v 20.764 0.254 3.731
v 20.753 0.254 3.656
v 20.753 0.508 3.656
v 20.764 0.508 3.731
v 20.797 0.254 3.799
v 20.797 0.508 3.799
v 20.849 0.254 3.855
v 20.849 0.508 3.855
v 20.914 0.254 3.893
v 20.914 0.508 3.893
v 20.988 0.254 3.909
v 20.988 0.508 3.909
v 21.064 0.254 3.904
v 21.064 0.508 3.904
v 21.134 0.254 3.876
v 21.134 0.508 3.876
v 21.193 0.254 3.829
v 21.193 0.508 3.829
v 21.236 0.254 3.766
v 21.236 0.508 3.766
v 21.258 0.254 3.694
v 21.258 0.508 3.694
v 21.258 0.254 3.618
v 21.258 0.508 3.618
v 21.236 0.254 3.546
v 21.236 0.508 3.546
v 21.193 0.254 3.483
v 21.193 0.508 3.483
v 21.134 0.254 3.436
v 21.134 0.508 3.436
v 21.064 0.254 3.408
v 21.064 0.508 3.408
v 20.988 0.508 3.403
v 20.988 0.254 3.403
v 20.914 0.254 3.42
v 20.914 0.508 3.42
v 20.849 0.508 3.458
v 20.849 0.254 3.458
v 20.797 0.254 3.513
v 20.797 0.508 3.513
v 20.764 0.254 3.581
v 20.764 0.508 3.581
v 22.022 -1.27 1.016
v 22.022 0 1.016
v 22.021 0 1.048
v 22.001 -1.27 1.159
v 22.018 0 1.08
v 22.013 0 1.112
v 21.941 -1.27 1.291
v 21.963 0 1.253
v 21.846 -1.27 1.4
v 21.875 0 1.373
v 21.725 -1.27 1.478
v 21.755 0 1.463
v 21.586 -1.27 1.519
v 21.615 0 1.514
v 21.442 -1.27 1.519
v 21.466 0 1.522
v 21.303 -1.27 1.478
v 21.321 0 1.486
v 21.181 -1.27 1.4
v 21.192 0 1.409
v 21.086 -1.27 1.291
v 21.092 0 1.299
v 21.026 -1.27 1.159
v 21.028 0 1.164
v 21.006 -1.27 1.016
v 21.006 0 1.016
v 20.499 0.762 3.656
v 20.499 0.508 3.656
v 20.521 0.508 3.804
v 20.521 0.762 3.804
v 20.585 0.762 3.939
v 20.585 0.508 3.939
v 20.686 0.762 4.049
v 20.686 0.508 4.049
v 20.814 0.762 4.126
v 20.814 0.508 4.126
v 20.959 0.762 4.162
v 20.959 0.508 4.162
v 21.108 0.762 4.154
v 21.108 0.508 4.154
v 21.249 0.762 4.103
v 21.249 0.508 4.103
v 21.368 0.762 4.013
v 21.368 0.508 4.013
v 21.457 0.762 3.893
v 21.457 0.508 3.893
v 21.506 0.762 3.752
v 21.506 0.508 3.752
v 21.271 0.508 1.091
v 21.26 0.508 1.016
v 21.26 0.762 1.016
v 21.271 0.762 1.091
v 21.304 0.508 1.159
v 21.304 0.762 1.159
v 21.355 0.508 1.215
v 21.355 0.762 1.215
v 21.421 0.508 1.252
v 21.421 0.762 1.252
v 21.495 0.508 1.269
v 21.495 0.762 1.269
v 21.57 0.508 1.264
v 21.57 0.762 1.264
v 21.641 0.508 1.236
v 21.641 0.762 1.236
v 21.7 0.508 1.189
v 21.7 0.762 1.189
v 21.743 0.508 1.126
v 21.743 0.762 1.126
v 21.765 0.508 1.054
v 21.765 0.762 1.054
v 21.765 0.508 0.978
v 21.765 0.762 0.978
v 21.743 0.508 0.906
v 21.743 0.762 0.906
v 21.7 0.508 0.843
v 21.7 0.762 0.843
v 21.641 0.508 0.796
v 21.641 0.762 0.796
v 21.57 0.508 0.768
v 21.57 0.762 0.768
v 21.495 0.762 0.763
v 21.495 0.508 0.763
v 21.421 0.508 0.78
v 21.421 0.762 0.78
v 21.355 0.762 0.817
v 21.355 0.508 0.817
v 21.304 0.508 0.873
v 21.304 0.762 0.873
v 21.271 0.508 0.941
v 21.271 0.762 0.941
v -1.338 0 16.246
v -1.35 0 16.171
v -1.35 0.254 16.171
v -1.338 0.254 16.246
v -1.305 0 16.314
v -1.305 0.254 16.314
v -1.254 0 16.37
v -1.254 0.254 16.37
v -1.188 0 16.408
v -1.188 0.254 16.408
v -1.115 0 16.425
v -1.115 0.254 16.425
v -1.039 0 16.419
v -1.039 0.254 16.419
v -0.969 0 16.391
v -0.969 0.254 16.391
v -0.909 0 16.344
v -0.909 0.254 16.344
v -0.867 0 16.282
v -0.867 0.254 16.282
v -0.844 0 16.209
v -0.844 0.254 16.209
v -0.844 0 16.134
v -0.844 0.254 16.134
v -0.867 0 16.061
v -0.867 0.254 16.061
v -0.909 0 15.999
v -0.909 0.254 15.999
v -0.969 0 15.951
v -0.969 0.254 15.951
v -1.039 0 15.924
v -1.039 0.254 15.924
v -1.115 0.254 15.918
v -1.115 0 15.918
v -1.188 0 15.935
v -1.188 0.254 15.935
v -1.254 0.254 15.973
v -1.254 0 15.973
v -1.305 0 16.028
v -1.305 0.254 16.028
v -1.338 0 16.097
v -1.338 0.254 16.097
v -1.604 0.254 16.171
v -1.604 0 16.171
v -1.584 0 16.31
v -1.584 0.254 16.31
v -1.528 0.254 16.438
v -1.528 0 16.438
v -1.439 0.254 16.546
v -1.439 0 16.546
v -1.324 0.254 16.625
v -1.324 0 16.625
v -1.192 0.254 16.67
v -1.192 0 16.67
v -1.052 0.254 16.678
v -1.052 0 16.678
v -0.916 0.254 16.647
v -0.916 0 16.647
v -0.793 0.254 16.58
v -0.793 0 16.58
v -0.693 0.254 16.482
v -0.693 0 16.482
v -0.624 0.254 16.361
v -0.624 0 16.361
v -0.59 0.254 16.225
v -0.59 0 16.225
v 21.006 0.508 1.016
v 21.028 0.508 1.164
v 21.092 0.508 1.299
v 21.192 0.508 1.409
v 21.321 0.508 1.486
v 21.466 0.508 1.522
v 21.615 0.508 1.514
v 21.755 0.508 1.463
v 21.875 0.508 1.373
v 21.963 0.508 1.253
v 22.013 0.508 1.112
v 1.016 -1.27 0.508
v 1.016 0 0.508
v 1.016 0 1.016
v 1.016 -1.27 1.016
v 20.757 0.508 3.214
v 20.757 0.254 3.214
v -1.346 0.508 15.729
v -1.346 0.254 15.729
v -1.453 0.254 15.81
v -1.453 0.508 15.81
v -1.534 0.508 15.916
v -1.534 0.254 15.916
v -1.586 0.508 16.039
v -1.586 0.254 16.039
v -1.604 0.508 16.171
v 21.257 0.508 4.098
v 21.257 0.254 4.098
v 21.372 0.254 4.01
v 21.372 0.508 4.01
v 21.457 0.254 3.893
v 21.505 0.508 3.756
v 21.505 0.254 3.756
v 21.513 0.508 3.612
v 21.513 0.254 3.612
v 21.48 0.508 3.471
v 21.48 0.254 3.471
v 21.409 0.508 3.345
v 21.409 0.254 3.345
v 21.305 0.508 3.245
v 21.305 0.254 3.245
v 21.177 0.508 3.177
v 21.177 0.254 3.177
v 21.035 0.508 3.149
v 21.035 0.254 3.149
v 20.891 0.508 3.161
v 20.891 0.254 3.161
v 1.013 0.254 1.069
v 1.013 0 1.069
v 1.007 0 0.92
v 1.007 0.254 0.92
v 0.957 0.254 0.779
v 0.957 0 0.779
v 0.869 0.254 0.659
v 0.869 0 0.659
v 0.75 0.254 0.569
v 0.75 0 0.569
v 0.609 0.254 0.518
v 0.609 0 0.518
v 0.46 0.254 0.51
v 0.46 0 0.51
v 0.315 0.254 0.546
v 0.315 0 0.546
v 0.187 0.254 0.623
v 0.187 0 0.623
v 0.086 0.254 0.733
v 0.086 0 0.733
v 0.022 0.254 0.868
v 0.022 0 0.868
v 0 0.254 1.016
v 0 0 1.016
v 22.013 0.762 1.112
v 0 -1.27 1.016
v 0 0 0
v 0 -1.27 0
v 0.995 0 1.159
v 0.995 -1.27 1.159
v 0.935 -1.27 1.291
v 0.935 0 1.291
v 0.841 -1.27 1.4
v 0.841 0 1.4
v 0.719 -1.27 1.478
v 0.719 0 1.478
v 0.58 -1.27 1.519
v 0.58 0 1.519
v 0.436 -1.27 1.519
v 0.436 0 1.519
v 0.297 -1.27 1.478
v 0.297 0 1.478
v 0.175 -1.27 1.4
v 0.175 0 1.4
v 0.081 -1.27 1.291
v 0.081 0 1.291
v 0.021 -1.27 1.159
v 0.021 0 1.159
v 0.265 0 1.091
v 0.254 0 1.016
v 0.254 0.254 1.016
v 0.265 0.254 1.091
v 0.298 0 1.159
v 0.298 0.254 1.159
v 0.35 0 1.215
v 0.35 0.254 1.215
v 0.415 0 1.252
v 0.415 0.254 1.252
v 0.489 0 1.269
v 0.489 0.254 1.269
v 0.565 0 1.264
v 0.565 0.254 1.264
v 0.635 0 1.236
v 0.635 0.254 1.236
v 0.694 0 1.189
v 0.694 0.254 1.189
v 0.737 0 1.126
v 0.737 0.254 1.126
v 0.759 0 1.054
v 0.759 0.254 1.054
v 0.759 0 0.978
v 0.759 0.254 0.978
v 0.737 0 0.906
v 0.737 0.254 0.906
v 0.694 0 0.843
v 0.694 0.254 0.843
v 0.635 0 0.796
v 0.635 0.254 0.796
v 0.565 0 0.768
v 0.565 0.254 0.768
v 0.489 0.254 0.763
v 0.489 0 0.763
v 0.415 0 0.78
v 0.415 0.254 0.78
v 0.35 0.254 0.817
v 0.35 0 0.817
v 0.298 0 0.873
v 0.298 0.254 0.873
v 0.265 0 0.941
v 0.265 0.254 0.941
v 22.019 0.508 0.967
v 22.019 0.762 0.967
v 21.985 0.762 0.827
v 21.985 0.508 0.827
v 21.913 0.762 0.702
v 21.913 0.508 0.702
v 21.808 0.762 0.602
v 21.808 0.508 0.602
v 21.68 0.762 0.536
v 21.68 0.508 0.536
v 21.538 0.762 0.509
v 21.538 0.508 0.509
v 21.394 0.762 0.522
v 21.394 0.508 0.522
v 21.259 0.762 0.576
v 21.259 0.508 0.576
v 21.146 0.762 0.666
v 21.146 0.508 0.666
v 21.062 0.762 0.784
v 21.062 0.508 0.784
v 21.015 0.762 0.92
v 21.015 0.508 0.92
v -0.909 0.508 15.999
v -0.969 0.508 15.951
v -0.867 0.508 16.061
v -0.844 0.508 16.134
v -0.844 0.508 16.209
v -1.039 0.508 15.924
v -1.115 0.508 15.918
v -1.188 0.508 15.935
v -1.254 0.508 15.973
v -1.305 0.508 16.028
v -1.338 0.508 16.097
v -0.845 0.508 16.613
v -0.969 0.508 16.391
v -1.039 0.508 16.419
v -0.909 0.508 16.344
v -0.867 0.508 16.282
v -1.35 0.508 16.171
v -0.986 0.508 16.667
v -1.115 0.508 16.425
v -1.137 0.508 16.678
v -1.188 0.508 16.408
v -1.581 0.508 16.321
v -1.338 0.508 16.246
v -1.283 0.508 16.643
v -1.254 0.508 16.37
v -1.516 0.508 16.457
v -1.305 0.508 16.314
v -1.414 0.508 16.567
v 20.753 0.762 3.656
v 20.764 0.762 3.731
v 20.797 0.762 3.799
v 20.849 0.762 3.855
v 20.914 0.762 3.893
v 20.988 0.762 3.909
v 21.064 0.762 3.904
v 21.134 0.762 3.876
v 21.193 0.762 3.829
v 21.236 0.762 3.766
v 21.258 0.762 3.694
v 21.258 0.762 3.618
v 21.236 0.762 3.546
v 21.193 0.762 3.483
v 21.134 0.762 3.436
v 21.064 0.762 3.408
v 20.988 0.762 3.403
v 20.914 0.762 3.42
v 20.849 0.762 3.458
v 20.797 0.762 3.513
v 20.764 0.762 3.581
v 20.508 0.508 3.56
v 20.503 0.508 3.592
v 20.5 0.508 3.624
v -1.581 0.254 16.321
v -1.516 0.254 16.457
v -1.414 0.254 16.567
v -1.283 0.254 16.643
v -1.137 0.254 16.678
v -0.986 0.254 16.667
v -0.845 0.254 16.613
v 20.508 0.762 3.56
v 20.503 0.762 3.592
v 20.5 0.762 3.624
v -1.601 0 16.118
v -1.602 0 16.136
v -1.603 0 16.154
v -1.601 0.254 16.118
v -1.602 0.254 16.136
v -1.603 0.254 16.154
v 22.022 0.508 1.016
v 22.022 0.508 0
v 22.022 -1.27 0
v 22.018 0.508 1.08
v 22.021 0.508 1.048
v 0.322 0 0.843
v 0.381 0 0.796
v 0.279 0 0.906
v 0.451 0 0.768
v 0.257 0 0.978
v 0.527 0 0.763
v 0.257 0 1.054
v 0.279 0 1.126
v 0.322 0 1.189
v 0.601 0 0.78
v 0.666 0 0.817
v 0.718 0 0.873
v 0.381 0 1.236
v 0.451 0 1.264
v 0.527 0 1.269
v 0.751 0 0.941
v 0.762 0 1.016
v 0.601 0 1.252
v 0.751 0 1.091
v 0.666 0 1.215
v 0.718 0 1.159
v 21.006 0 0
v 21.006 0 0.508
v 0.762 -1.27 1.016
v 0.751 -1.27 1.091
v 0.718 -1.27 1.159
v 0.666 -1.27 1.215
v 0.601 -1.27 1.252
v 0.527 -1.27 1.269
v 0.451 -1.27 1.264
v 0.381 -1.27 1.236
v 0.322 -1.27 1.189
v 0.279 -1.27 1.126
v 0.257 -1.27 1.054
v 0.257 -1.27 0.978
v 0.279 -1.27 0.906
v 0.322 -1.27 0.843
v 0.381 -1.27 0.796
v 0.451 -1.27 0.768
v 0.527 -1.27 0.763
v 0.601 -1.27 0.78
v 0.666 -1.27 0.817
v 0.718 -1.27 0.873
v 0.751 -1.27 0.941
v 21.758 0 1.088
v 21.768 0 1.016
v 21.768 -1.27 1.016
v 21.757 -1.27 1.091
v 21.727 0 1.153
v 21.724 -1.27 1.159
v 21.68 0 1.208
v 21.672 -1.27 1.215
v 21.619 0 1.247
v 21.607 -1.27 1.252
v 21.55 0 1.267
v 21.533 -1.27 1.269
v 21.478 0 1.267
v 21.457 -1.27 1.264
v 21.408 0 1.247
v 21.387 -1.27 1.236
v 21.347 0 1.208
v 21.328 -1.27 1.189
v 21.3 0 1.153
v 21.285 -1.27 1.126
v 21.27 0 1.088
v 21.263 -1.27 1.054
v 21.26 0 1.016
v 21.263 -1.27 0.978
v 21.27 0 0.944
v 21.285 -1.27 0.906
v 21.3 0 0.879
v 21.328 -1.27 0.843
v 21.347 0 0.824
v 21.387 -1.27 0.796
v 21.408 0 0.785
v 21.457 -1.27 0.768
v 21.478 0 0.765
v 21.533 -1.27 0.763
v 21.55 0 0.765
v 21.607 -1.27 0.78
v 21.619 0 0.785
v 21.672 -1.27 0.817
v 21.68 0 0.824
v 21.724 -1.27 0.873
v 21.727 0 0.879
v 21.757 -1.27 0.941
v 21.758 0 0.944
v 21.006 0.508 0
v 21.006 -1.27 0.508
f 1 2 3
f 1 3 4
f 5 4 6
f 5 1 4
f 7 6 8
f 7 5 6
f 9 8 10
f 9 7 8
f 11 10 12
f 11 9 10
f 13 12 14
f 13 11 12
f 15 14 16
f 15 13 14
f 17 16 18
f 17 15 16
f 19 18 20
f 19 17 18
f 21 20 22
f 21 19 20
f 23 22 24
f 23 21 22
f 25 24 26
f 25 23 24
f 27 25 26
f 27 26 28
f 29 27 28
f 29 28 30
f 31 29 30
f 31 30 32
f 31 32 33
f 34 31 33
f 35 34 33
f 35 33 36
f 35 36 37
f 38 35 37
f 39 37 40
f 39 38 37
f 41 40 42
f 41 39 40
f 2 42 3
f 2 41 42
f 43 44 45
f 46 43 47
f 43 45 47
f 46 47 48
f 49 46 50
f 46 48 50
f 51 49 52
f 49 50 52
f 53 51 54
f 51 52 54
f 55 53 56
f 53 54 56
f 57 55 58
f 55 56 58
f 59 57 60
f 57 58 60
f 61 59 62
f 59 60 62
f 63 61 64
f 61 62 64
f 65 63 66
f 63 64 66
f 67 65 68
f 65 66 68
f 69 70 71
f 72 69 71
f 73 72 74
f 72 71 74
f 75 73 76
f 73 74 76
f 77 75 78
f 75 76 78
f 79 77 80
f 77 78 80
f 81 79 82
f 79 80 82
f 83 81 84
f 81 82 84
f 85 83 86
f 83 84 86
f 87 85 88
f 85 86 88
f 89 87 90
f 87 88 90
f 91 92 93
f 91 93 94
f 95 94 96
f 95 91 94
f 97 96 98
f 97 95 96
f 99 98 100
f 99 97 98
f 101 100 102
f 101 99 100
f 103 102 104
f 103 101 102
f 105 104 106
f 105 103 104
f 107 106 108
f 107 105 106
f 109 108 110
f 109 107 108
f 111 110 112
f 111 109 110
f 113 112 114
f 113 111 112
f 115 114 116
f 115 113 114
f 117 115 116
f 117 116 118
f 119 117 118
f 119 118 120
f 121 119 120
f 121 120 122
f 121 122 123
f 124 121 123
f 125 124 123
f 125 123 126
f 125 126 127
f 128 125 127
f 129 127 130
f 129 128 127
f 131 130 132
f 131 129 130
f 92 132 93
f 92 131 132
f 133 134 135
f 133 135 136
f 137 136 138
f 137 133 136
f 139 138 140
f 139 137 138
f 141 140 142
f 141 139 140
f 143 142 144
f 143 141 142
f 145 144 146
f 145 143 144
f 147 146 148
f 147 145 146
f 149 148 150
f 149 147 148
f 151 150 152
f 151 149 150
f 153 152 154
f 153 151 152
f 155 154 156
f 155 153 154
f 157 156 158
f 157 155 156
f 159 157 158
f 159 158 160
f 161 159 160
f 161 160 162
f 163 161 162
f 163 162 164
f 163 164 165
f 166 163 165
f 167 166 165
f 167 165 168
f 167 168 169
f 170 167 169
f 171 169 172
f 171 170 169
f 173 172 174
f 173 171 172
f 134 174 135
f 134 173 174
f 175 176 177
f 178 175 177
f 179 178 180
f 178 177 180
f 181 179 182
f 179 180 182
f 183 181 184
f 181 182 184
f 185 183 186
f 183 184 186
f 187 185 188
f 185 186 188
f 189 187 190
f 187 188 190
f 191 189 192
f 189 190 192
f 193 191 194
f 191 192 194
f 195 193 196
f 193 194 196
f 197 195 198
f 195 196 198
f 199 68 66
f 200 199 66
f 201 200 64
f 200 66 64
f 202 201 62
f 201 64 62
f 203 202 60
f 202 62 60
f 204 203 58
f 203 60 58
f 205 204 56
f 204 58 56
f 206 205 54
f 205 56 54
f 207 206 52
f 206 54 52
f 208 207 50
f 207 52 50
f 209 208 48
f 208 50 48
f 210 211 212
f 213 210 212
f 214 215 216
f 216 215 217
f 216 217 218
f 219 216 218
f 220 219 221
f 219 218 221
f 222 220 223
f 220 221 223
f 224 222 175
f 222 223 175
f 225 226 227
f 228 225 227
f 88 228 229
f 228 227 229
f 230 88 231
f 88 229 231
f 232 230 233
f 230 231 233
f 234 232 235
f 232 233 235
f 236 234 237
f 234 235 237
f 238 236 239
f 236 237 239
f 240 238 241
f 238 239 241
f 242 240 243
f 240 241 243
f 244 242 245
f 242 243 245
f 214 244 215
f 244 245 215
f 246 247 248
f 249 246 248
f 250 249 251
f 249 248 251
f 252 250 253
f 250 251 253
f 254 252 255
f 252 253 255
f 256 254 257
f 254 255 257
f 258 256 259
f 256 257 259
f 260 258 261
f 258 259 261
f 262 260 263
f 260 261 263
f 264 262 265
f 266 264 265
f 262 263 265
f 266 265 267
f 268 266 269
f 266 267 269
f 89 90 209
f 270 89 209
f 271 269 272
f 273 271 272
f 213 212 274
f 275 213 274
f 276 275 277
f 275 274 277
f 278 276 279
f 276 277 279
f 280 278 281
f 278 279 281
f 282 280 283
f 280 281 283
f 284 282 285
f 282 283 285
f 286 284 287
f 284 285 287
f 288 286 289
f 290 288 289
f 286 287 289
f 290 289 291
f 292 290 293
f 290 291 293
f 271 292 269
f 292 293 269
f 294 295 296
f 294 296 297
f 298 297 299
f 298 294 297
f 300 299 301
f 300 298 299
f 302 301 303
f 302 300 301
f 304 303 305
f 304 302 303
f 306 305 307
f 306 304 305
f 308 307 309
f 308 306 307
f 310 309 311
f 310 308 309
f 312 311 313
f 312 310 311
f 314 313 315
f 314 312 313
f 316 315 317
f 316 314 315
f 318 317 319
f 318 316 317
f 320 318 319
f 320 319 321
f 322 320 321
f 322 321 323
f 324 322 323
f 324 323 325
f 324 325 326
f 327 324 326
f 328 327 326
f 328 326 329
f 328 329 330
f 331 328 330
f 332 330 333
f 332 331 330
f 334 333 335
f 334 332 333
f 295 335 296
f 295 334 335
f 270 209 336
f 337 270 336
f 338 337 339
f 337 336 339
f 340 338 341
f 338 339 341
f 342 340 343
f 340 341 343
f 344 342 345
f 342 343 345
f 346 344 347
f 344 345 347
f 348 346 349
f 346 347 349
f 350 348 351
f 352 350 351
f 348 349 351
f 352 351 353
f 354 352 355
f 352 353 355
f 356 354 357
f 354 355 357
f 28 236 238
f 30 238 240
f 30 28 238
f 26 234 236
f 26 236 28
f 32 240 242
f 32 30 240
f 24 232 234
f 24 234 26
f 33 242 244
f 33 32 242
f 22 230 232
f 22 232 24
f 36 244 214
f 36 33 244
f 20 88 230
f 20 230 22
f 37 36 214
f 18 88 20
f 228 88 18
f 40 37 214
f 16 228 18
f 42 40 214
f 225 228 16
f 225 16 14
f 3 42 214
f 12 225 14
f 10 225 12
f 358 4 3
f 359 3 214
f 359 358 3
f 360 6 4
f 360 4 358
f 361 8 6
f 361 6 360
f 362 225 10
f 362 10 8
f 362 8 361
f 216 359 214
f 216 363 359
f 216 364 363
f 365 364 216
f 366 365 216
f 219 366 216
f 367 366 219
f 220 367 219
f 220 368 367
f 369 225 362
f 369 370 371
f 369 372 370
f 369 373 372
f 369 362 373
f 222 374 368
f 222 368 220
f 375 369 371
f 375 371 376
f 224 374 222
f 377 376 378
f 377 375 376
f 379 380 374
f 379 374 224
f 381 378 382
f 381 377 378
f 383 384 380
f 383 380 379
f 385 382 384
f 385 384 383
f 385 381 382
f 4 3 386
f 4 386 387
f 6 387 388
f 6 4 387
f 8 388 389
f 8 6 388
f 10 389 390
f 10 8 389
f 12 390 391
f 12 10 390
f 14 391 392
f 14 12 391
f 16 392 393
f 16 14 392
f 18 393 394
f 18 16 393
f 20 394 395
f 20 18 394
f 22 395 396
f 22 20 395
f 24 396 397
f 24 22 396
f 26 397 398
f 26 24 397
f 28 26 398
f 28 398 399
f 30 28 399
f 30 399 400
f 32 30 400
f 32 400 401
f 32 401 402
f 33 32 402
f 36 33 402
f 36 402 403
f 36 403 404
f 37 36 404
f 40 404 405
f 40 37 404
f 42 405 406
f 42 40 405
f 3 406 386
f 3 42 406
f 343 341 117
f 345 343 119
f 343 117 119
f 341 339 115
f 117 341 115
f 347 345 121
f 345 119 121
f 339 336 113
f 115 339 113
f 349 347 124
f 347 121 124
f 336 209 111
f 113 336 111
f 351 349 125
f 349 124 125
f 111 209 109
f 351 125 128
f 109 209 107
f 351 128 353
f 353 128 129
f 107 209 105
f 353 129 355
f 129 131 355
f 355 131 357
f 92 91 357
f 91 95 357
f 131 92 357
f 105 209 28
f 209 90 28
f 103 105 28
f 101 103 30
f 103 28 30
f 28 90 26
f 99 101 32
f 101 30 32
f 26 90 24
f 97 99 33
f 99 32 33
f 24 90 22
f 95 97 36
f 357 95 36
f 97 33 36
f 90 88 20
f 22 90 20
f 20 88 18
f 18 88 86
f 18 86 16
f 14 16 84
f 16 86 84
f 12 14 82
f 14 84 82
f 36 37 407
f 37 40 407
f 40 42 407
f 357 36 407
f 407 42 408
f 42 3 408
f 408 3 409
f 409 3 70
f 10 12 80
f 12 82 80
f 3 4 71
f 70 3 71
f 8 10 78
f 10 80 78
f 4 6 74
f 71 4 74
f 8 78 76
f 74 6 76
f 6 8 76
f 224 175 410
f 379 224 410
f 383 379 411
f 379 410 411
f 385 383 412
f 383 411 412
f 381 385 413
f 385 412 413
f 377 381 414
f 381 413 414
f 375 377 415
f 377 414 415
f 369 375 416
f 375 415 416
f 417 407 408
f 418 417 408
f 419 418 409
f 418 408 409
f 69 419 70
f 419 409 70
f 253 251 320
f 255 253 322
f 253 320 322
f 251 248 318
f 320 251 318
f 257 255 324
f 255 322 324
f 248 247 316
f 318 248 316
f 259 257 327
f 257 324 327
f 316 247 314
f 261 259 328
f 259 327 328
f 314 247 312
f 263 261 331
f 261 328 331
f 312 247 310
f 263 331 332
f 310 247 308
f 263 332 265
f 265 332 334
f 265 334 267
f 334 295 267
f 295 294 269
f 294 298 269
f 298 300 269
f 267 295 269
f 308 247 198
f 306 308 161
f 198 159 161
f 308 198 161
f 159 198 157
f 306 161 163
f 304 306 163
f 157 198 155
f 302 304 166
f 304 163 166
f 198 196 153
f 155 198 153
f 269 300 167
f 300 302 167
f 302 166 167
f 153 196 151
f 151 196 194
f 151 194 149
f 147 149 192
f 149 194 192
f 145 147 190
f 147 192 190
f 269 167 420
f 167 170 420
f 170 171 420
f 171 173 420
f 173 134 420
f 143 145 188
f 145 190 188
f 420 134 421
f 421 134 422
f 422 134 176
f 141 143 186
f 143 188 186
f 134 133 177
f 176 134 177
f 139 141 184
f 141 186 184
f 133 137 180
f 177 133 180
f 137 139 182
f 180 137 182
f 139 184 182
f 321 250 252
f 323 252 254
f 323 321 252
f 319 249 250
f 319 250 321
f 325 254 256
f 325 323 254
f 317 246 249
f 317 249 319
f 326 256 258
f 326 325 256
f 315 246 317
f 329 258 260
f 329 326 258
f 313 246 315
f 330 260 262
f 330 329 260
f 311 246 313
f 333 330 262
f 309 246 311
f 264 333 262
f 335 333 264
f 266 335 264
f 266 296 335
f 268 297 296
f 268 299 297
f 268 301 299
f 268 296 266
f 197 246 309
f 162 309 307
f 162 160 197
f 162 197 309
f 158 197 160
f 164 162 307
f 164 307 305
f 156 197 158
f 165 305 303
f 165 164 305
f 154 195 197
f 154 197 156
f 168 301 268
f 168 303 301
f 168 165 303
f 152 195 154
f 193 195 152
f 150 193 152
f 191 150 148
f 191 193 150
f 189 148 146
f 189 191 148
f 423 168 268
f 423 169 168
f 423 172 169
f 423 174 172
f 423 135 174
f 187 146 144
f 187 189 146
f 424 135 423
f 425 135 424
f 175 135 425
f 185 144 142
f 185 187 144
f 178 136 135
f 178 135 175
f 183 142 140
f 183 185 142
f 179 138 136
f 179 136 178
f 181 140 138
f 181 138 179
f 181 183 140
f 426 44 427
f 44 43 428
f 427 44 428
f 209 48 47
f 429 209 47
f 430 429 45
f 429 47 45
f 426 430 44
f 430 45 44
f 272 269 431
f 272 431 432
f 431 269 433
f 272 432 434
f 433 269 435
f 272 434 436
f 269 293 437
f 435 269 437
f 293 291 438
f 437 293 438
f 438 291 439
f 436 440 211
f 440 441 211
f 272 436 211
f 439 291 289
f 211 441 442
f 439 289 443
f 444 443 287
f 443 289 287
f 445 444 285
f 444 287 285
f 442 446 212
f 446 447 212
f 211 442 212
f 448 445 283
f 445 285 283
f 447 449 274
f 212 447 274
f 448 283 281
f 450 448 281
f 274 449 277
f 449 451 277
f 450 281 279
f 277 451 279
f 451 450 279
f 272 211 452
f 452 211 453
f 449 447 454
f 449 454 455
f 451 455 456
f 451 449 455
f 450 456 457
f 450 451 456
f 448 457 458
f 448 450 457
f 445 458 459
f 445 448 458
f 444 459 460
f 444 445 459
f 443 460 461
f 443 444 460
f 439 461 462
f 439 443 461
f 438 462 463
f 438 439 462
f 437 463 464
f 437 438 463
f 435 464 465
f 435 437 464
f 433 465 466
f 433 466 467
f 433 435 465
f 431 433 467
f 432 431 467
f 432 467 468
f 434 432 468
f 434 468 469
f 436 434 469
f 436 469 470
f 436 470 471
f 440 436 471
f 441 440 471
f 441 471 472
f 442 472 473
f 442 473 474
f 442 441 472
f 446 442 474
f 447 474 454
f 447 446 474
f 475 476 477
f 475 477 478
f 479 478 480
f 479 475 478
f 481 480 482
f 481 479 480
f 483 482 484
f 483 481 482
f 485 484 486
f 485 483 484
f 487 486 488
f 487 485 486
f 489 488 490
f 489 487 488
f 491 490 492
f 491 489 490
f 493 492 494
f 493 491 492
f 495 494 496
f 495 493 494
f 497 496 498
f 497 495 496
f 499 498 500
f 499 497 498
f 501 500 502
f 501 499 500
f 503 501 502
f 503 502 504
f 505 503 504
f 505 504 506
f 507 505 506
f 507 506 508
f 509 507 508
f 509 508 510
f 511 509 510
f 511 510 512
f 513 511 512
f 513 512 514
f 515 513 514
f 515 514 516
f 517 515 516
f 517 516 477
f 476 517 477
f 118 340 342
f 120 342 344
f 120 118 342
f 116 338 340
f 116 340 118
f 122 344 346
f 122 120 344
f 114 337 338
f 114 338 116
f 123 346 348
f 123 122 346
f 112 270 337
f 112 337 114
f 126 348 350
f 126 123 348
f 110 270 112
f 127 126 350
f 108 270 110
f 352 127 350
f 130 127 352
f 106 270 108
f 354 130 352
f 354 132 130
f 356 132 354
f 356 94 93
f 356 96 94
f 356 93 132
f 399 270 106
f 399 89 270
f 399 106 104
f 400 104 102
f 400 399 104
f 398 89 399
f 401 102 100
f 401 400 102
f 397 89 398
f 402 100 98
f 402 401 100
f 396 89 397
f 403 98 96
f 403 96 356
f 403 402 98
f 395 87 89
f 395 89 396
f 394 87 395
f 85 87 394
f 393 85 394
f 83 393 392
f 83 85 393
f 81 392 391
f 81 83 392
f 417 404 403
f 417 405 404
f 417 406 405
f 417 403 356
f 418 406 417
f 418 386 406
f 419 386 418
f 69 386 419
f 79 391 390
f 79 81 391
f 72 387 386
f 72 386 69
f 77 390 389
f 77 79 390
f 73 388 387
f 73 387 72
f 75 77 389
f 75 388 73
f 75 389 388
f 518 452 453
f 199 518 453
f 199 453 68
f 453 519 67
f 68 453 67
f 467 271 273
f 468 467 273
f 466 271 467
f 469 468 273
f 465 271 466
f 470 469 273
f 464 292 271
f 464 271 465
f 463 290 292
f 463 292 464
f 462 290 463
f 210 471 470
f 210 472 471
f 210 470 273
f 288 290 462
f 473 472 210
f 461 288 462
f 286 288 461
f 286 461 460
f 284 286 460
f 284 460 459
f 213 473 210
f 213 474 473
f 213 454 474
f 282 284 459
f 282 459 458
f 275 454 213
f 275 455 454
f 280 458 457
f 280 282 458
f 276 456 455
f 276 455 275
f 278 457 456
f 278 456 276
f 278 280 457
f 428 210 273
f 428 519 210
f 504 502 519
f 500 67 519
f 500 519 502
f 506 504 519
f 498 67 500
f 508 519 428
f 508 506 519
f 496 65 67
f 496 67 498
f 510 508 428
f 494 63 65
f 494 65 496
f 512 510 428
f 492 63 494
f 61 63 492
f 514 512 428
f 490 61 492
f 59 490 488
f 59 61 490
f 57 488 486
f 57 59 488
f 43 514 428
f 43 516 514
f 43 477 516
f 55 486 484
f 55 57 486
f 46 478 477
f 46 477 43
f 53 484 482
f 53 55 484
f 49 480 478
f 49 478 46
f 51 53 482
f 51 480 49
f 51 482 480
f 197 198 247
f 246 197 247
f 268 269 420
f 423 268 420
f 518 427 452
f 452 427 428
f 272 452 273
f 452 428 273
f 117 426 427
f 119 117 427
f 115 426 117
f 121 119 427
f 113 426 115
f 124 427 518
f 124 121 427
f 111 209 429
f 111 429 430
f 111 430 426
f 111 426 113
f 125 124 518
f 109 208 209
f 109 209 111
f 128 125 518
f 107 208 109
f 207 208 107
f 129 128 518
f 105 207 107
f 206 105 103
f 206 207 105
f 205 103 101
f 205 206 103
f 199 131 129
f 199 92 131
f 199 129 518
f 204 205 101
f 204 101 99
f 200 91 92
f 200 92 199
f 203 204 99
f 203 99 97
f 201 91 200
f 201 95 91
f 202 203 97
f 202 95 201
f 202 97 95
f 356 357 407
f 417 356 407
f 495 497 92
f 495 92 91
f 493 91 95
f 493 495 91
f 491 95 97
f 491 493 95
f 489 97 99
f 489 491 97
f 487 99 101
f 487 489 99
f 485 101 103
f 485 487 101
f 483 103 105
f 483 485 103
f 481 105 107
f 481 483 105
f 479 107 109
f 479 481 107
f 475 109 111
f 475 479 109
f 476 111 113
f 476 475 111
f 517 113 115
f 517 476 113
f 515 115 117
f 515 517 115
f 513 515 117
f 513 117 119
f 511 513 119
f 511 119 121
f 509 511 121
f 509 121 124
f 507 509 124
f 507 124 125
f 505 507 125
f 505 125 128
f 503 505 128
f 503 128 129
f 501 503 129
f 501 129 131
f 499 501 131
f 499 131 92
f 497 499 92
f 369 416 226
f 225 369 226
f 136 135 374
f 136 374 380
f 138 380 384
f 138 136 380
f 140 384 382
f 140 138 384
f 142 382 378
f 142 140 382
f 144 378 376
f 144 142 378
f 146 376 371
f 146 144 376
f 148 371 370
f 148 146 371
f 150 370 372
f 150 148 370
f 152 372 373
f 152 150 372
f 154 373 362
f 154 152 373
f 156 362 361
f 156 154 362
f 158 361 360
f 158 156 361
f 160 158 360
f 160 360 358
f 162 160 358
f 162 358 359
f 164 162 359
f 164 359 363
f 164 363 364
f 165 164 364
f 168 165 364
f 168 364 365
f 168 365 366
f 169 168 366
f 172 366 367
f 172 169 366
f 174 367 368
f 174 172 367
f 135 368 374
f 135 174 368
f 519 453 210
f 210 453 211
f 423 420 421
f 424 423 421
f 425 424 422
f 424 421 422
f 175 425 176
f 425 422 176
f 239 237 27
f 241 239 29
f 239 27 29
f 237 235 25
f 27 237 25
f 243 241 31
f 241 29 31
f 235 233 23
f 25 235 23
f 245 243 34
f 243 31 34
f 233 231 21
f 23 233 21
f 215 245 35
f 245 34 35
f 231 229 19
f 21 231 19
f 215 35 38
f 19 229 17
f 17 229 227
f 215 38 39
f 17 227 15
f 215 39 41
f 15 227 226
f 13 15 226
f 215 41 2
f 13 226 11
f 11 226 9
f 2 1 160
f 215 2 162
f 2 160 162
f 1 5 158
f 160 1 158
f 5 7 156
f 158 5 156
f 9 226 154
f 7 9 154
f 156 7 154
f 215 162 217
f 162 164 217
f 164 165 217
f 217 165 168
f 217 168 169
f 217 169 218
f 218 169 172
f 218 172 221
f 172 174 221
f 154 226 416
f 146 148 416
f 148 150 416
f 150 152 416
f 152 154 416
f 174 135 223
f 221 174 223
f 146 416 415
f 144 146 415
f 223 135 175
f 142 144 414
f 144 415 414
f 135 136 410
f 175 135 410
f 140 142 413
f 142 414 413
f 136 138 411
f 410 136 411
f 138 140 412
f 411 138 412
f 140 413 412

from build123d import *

# Parameters (mm, degrees)
F0_R     = 0.254
F1_DEPTH = 1.27
F2_R     = 0.254
F3_DEPTH = 0.254
F4_R     = 0.254
F5_DEPTH = 0.254
F6_R     = 0.254
F7_DEPTH = 0.254
F8_R     = 0.254
F9_DEPTH = 0.508


with BuildPart() as f1:
    # F0 (on Front) → F1 (new body)
    with BuildSketch(Plane.XZ):
        with BuildLine():
            Line((0, 1.016), (0, 0.508))
            Line((0, 0.508), (1.016, 0.508))
            Line((1.016, 0.508), (1.016, 1.016))
            ThreePointArc((1.016, 1.016), (0.508, 1.524), (0, 1.016))
        make_face()
        with Locations((0.508, 1.016)):
            Circle(F0_R, mode=Mode.SUBTRACT)
        Polygon((0, 0.508), (0, 0), (22.0218, 0), (22.0218, 0.508), (21.0058, 0.508), (1.016, 0.508), align=None)
        with BuildLine():
            Line((21.0058, 0.508), (22.0218, 0.508))
            Line((22.0218, 0.508), (22.0218, 1.016))
            ThreePointArc((22.0218, 1.016), (21.5138, 1.524), (21.0058, 1.016))
            Line((21.0058, 1.016), (21.0058, 0.508))
        make_face()
        with Locations((21.5138, 1.016)):
            Circle(F0_R, mode=Mode.SUBTRACT)
    extrude(amount=F1_DEPTH)

    # F8 (on face) → F9 (join)
    with BuildSketch(Plane(origin=(0, 0, 0), x_dir=(-1, 0, 0), z_dir=(0, 1, 0))):
        with BuildLine():
            ThreePointArc((-22.0126938926, 1.1117542892), (-22.0195183492, 1.064093152), (-22.0218, 1.016))
            Line((-22.0218, 1.016), (-22.0218, 0.508))
            Line((-22.0218, 0.508), (-22.0218, 0))
            Line((-22.0218, 0), (-21.0058, 0))
            Line((-21.0058, 0), (-21.0058, 0.508))
            Line((-21.0058, 0.508), (-21.0058, 1.016))
            ThreePointArc((-21.0058, 1.016), (-21.465706848, 1.5217183492), (-22.0126938926, 1.1117542892))
        make_face()
        with Locations((-21.5138, 1.016)):
            Circle(F8_R, mode=Mode.SUBTRACT)
    extrude(amount=F9_DEPTH)


with BuildPart() as f3:
    # F2 (on face) → F3 (new body)
    with BuildSketch(Plane(origin=(0, 0, 0), x_dir=(-1, 0, 0), z_dir=(0, 1, 0))):
        with BuildLine():
            ThreePointArc((-1.0131799286, 1.0694531545), (-0.5347637466, 0.5087055077), (0, 1.016))
            ThreePointArc((0, 1.016), (-0.4812362534, 1.5232944923), (-1.0131799286, 1.0694531545))
        make_face()
        with Locations((-0.508, 1.016)):
            Circle(F2_R, mode=Mode.SUBTRACT)
        with BuildLine():
            ThreePointArc((-1.0131799286, 1.0694531545), (-0.4812362534, 1.5232944923), (0, 1.016))
            Line((0, 1.016), (1.6007646277, 16.1178508951))
            ThreePointArc((1.6007646277, 16.1178508951), (1.0420945746, 15.6662228951), (0.5904147052, 16.224851013))
            Line((0.5904147052, 16.224851013), (-1.0131799286, 1.0694531545))
        make_face()
        with BuildLine():
            ThreePointArc((0.5904147052, 16.224851013), (1.0420945746, 15.6662228951), (1.6007646277, 16.1178508951))
            ThreePointArc((1.6007646277, 16.1178508951), (1.6028866389, 16.1445870108), (1.6035946338, 16.1713978585))
            ThreePointArc((1.6035946338, 16.1713978585), (1.1223583804, 16.6786923508), (0.5904147052, 16.224851013))
        make_face()
        with Locations((1.0955946338, 16.1713978585)):
            Circle(F2_R, mode=Mode.SUBTRACT)
    extrude(amount=F3_DEPTH)


with BuildPart() as f5:
    # F4 (on face) → F5 (new body)
    with BuildSketch(Plane(origin=(0, 0.254, 0), x_dir=(-1, 0, 0), z_dir=(0, 1, 0))):
        with BuildLine():
            ThreePointArc((1.3459001233, 15.7293445112), (1.5344677297, 15.9155572721), (1.6035946338, 16.1713978585))
            ThreePointArc((1.6035946338, 16.1713978585), (1.3514352202, 16.6102709545), (0.8452891443, 16.6134512059))
            ThreePointArc((0.8452891443, 16.6134512059), (0.6535412864, 15.921092369), (1.3459001233, 15.7293445112))
        make_face()
        with Locations((1.0955946338, 16.1713978585)):
            Circle(F4_R, mode=Mode.SUBTRACT)
        with BuildLine():
            ThreePointArc((1.3459001233, 15.7293445112), (0.6535412864, 15.921092369), (0.8452891443, 16.6134512059))
            Line((0.8452891443, 16.6134512059), (-21.2573782243, 4.0981767306))
            ThreePointArc((-21.2573782243, 4.0981767306), (-20.7512321484, 4.0949964791), (-20.4990727348, 3.6561233832))
            ThreePointArc((-20.4990727348, 3.6561233832), (-20.5681996389, 3.4002827968), (-20.7567672453, 3.2140700358))
            Line((-20.7567672453, 3.2140700358), (1.3459001233, 15.7293445112))
        make_face()
        with BuildLine():
            ThreePointArc((-20.4990727348, 3.6561233832), (-20.7512321484, 4.0949964791), (-21.2573782243, 4.0981767306))
            ThreePointArc((-21.2573782243, 4.0981767306), (-21.4491260822, 3.4058178937), (-20.7567672453, 3.2140700358))
            ThreePointArc((-20.7567672453, 3.2140700358), (-20.5681996389, 3.4002827968), (-20.4990727348, 3.6561233832))
        make_face()
        with Locations((-21.0070727348, 3.6561233832)):
            Circle(F4_R, mode=Mode.SUBTRACT)
    extrude(amount=F5_DEPTH)


with BuildPart() as f7:
    # F6 (on face) → F7 (new body)
    with BuildSketch(Plane(origin=(0, 0.508, 0), x_dir=(-1, 0, 0), z_dir=(0, 1, 0))):
        with BuildLine():
            ThreePointArc((-20.5081788422, 3.5603690941), (-20.5013543856, 3.6080302312), (-20.4990727348, 3.6561233832))
            ThreePointArc((-20.4990727348, 3.6561233832), (-20.9589795828, 4.1618417324), (-21.5059666274, 3.7518776724))
            ThreePointArc((-21.5059666274, 3.7518776724), (-21.102827024, 3.1572294906), (-20.5081788422, 3.5603690941))
        make_face()
        with Locations((-21.0070727348, 3.6561233832)):
            Circle(F6_R, mode=Mode.SUBTRACT)
        with BuildLine():
            ThreePointArc((-20.5081788422, 3.5603690941), (-21.102827024, 3.1572294906), (-21.5059666274, 3.7518776724))
            Line((-21.5059666274, 3.7518776724), (-22.0126938926, 1.1117542892))
            ThreePointArc((-22.0126938926, 1.1117542892), (-21.465706848, 1.5217183492), (-21.0058, 1.016))
            ThreePointArc((-21.0058, 1.016), (-21.0080816508, 0.967906848), (-21.0149061074, 0.9202457108))
            Line((-21.0149061074, 0.9202457108), (-20.5081788422, 3.5603690941))
        make_face()
        with BuildLine():
            ThreePointArc((-21.0058, 1.016), (-21.465706848, 1.5217183492), (-22.0126938926, 1.1117542892))
            ThreePointArc((-22.0126938926, 1.1117542892), (-21.6095542892, 0.5171061074), (-21.0149061074, 0.9202457108))
            ThreePointArc((-21.0149061074, 0.9202457108), (-21.0080816508, 0.967906848), (-21.0058, 1.016))
        make_face()
        with Locations((-21.5138, 1.016)):
            Circle(F6_R, mode=Mode.SUBTRACT)
    extrude(amount=F7_DEPTH)


solid = Compound([f1.part, f3.part, f5.part, f7.part])
